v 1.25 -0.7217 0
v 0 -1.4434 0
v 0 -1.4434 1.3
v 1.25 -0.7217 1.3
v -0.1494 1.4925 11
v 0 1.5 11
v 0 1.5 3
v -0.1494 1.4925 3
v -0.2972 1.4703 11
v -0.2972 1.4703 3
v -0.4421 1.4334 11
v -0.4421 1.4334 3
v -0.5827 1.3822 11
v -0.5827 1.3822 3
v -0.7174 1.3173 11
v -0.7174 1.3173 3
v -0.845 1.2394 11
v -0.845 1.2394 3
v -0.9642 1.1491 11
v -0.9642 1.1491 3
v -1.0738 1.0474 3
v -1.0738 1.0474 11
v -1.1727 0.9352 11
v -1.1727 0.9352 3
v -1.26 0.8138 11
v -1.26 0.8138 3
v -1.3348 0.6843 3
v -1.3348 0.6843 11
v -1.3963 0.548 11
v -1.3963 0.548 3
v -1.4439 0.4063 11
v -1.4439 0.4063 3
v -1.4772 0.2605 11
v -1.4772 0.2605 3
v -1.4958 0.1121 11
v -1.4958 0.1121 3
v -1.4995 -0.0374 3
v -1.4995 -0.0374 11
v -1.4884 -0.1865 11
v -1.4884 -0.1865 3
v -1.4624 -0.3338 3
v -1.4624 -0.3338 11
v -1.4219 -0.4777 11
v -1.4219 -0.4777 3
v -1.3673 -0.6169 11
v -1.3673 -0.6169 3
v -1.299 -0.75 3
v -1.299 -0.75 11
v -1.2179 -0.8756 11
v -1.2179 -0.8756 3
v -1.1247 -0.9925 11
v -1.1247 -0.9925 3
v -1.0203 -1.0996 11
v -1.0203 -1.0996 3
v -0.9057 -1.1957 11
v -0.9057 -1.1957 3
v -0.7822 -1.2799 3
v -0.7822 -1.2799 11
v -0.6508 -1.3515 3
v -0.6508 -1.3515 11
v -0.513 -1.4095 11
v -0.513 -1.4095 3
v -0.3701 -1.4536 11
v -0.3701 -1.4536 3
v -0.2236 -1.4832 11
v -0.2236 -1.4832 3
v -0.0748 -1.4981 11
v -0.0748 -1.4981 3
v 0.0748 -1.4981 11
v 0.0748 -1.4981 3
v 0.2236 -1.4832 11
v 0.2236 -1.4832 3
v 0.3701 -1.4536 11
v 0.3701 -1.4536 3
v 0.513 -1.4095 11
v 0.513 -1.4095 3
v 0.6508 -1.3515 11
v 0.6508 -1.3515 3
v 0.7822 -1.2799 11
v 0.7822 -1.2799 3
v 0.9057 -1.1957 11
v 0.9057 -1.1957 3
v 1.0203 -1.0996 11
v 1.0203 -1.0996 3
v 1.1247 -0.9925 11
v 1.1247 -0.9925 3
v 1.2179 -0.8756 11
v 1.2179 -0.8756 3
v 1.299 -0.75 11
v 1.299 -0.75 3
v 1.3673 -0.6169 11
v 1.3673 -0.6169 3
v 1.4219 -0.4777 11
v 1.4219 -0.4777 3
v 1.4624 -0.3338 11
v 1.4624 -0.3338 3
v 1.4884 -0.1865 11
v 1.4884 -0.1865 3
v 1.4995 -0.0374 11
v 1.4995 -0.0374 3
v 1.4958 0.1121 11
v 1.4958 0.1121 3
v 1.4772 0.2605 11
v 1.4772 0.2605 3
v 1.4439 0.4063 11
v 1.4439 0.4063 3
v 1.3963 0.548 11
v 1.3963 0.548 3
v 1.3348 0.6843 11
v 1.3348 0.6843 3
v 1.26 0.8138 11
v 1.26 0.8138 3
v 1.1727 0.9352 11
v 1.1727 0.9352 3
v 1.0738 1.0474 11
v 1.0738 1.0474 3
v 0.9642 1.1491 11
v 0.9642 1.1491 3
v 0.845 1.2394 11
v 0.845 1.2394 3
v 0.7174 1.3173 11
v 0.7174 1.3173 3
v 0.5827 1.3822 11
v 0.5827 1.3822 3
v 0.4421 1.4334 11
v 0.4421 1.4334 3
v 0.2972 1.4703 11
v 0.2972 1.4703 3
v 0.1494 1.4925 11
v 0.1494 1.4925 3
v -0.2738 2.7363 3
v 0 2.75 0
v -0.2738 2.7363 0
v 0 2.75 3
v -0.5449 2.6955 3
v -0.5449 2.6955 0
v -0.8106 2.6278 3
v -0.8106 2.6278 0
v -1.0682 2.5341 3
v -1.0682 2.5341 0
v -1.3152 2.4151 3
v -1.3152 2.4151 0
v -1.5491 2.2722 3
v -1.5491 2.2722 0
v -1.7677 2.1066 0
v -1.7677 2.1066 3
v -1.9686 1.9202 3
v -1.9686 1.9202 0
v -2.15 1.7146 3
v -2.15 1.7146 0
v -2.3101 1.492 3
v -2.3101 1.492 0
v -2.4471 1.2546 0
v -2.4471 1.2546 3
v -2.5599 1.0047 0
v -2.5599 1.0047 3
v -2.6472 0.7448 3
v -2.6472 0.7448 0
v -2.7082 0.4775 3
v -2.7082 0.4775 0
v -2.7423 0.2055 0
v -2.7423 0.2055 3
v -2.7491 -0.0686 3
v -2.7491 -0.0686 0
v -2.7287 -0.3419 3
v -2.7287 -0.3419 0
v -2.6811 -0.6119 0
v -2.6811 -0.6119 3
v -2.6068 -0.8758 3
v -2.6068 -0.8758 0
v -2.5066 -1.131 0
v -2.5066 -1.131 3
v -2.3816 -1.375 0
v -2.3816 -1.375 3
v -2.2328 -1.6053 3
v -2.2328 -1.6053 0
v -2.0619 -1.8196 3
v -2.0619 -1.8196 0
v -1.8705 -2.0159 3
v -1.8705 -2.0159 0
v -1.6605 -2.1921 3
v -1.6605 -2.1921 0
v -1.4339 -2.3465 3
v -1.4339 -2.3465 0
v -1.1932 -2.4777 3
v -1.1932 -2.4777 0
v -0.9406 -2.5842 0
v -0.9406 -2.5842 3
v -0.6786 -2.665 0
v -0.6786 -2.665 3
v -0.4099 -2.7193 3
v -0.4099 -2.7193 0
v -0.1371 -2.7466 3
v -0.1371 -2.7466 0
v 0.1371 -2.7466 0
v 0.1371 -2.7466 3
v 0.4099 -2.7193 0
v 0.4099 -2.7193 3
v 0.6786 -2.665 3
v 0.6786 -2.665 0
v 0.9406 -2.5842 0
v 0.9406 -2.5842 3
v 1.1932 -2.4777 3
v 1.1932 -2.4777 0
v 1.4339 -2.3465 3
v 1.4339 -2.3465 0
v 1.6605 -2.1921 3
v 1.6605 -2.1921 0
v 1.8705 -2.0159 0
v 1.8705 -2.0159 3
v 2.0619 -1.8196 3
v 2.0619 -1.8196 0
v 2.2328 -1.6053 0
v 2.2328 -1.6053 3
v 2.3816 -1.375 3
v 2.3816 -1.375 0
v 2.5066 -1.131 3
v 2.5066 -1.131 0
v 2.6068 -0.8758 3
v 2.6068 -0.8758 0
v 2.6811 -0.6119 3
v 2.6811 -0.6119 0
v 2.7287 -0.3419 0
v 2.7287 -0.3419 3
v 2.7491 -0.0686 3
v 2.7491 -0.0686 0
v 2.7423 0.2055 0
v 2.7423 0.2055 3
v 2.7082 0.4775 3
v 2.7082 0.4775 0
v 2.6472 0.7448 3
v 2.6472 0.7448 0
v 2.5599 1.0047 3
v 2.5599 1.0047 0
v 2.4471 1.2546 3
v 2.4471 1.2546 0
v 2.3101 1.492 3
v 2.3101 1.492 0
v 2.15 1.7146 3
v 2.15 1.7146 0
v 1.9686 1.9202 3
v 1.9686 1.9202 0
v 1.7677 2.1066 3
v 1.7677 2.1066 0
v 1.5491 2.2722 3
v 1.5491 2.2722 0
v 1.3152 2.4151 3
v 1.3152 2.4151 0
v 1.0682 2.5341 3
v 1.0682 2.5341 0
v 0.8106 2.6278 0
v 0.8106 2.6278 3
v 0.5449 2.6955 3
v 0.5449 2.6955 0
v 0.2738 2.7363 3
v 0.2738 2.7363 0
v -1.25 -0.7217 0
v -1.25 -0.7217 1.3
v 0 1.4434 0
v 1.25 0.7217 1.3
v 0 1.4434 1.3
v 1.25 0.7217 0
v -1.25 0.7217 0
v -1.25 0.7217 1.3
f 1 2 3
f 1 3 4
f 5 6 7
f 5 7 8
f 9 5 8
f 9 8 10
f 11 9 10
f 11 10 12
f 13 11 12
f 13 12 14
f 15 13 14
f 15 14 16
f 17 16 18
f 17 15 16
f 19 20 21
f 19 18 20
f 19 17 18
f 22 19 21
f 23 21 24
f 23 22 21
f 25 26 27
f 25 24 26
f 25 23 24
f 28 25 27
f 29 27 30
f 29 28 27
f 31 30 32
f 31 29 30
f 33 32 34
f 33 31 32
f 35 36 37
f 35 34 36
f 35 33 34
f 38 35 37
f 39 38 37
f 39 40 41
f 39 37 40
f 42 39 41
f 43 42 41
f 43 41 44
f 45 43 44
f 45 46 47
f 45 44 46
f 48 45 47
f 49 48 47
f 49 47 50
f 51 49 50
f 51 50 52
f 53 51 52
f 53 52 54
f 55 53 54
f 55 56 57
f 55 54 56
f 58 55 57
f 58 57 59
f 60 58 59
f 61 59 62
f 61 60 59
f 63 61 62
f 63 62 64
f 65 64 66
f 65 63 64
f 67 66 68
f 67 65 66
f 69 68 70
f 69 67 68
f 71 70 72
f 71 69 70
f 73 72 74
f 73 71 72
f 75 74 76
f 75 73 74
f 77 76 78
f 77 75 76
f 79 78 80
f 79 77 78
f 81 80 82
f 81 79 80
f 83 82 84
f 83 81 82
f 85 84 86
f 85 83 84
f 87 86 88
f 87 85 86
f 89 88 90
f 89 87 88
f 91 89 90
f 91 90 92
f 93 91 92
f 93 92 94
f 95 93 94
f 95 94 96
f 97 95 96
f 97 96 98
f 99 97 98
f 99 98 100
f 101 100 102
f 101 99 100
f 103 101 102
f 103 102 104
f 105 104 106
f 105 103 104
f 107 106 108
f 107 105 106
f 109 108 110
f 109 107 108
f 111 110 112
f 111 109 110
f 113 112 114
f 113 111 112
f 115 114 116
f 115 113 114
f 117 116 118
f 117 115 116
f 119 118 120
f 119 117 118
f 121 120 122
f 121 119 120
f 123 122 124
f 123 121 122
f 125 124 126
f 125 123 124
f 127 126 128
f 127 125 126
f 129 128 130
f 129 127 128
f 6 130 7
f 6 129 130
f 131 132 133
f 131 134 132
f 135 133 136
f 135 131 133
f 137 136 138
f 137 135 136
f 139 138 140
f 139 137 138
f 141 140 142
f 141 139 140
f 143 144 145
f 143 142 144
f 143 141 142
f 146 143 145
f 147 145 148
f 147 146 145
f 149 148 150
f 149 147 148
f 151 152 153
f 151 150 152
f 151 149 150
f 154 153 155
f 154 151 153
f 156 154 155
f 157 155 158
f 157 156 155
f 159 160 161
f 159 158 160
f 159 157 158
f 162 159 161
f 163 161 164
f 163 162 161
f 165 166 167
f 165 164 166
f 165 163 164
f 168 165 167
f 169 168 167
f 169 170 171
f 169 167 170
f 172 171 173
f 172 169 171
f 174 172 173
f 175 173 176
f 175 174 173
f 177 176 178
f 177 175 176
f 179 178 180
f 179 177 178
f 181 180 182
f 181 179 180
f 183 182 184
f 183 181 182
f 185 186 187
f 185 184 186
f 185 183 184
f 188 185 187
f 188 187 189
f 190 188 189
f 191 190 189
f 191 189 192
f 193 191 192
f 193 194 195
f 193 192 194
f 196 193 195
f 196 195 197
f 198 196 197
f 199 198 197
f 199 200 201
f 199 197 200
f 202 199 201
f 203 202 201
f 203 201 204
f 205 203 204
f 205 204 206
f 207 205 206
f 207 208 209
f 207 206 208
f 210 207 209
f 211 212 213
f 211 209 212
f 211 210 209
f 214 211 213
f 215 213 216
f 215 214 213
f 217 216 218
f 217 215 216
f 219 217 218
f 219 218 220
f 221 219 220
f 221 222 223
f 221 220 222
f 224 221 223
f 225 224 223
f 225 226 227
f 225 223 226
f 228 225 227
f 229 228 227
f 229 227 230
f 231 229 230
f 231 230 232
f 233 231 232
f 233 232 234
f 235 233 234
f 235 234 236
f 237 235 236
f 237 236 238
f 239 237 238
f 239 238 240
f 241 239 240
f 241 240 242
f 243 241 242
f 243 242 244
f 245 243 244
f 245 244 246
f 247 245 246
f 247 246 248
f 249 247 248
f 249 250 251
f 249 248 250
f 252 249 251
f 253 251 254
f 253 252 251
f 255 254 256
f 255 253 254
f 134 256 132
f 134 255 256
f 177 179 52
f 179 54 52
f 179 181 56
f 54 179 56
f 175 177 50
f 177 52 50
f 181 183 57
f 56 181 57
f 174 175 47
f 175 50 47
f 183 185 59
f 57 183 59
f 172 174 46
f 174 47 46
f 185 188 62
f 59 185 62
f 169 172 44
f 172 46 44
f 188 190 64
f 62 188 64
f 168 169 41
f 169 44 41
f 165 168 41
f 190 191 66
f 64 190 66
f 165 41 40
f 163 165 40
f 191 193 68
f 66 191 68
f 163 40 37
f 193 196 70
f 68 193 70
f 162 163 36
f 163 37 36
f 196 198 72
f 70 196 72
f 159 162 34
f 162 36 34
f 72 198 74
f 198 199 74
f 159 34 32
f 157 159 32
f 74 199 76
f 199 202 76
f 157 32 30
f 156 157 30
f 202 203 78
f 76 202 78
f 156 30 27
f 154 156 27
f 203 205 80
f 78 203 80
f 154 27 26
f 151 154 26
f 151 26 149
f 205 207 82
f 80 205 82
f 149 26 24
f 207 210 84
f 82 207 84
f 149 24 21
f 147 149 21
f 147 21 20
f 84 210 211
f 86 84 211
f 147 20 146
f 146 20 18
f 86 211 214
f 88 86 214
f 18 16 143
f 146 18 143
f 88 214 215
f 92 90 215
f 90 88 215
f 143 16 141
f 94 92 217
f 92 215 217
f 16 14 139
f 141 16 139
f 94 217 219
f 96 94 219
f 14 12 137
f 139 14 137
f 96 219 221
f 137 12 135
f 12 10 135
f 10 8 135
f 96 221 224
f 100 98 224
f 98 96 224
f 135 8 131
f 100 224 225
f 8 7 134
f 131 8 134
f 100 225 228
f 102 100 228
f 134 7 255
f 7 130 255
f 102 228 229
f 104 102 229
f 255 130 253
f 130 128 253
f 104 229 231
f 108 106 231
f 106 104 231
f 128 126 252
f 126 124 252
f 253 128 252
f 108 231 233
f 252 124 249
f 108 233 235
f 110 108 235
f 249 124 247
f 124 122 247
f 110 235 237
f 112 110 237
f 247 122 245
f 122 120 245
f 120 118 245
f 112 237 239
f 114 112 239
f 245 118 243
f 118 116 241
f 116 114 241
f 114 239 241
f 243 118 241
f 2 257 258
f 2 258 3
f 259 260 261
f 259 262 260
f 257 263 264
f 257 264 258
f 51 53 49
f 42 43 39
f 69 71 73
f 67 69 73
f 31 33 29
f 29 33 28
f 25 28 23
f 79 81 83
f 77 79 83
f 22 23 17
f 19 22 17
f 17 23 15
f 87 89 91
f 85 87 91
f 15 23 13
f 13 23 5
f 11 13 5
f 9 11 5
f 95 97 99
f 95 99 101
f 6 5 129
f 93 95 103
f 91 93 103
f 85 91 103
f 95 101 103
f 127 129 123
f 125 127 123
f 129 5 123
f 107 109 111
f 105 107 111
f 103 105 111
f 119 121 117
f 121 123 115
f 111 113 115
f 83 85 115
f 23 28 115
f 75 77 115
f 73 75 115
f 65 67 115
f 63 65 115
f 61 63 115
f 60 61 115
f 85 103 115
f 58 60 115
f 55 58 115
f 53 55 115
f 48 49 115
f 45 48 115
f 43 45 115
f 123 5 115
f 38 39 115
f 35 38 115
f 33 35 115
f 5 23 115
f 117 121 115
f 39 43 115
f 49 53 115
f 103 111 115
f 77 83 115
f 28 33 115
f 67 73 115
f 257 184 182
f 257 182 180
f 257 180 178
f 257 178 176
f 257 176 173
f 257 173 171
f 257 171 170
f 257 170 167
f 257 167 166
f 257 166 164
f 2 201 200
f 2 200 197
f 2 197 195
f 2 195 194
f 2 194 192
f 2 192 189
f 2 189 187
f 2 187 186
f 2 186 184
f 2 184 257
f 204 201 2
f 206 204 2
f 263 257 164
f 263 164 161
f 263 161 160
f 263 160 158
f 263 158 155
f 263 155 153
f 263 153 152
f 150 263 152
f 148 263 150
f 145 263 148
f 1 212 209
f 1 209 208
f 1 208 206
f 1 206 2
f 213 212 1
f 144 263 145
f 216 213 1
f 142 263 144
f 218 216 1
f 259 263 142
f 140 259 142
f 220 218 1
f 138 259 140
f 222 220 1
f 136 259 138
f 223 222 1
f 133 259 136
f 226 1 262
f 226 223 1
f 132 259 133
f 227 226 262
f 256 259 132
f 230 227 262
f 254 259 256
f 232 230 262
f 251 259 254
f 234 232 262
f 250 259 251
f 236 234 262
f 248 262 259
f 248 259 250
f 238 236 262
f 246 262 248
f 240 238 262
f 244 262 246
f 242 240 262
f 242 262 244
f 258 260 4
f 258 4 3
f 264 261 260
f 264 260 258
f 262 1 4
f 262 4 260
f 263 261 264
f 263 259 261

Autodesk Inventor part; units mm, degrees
ref_plane "YZ Plane" through (0, 0, 0) normal (1, 0, 0) x (0, 1, 0)
ref_plane "XZ Plane" through (0, 0, 0) normal (0, 1, 0) x (-1, 0, 0)
ref_plane "XY Plane" through (0, 0, 0) normal (0, 0, 1) x (1, 0, 0)
sketch "スケッチ1" plane through (0, 0, 0) normal (1, 0, 0) x (0, 1, 0)
  line L0 (0, 11) -> (0, 0)
  line L1 (0, 0) -> (2.75, 0)
  line L2 (2.75, 0) -> (2.75, 3)
  line L3 (2.75, 3) -> (1.5, 3)
  line L4 (1.5, 3) -> (1.5, 11)
  line L5 (1.5, 11) -> (0, 11)
  dimension "d2" = 3
  dimension "d10" = 8
  dimension "d11" = 3
  dimension "d12" = 5.5
revolve "回転1" add sketch "スケッチ1" angle 360 about axis through (0, 0, 11) along (0, 0, -1)
thread "ねじ1" size "M3x0.5" class "6g" standard "ANSI Metric M Profile" full length
sketch "スケッチ2" plane through (0, 0, 0) normal (0, 0, -1) x (-1, 0, 0)
  line L0 (0, 1.4434) -> (1.25, 0.7217)
  line L1 (1.25, 0.7217) -> (1.25, -0.7217)
  line L2 (1.25, -0.7217) -> (0, -1.4434)
  line L3 (0, -1.4434) -> (-1.25, -0.7217)
  line L4 (-1.25, -0.7217) -> (-1.25, 0.7217)
  line L5 (-1.25, 0.7217) -> (0, 1.4434)
  circle A0 centre (0, 0) radius 2.75 projected
  line L6 (0, 2.75) -> (0, -2.75) construction
  dimension "d7" = 2.5
extrude "押し出し1" cut sketch "スケッチ2" against normal blind 1.3 contours L0 L1 L2 L3 L4 L5
properties part number "UC-0308" material "ステンレス鋼 AISI 304"
